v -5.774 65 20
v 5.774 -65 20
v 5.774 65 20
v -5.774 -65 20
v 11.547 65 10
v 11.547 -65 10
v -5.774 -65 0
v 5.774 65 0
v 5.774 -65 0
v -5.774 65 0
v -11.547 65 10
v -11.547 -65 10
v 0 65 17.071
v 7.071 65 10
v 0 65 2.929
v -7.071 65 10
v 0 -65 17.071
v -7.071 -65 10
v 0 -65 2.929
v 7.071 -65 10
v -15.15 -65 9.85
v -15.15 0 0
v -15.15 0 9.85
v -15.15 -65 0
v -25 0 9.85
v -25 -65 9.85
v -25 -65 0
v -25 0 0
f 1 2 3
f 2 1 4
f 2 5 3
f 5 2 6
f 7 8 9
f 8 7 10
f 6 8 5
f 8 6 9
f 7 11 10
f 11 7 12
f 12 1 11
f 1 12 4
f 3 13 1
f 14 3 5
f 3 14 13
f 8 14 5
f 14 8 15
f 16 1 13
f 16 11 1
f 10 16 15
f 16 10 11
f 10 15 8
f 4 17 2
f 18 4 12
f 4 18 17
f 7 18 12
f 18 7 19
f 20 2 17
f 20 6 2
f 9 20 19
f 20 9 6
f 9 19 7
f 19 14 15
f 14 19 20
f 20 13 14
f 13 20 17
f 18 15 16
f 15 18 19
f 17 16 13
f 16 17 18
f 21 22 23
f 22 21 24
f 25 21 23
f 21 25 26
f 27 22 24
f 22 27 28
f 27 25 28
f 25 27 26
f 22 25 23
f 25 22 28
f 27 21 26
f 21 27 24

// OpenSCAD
length=130;
width=20;

nozzle=0.6;
spring_width=1*nozzle+0.05;

slop=0.15;

module wiggly(d, h) {
    //z_step = h/(ceil(h/2));
    z_step = h/4;
    echo(z_step);
    
    for (i = [0:4]) {
        translate([0,0,i*z_step]) linear_extrude(height=z_step, center=true, convexity = 10, twist = 360, $fn = 30) translate([0.2, 0, 0]) circle(d=d-0.4);
    }
}

module hexagon(inner_diameter, height) {
    $fn=6;
    dia = sqrt(((inner_diameter/2)*(inner_diameter/2))/0.75) * 2;
    echo (dia);
    cylinder(d=dia, h=height);
}

module _rail(length, width) {
    rotate([-90,0,0]) hexagon(width, length);
}

module rail(length, width) {
    difference() {
        _rail(length, width);
        #translate([0,length/2,0]) rotate([0,45,0]) cube([width/2, length, width/2], center=true);
    }
}


module slide(height) {
    
    module spring() {
        $fn=60;
        intersection() {
            difference() {
                wiggly(d=11, h=height);
                wiggly(d=11-2*spring_width, h=height);
            }
            translate([-13,2.5,height/2]) rotate([0,0,-65]) cube([20,20,height], center=true);
        }
    }

    rotate([90,0,0]) difference() {
        _rail(height, width*1.55);
        _rail(height+1, width*1.25);
    }
    
    for (i = [1:6]) {
        angle = 360/6*i;
        rotate([0,0,angle]) translate([0,15.5,0]) rotate([0,0,65]) spring();
    }

}


//translate([32,0,0]) rotate([90,0,0]) rail(length,width);
translate([0,-length/2,width/2]) rail(length,width);
//translate([32,0,0]) slide(15);
//translate([-25,0,0]) wiggly(11,10);
translate([-25,-length/2,0]) cube([width/2-slop, length/2,width/2-slop]);
